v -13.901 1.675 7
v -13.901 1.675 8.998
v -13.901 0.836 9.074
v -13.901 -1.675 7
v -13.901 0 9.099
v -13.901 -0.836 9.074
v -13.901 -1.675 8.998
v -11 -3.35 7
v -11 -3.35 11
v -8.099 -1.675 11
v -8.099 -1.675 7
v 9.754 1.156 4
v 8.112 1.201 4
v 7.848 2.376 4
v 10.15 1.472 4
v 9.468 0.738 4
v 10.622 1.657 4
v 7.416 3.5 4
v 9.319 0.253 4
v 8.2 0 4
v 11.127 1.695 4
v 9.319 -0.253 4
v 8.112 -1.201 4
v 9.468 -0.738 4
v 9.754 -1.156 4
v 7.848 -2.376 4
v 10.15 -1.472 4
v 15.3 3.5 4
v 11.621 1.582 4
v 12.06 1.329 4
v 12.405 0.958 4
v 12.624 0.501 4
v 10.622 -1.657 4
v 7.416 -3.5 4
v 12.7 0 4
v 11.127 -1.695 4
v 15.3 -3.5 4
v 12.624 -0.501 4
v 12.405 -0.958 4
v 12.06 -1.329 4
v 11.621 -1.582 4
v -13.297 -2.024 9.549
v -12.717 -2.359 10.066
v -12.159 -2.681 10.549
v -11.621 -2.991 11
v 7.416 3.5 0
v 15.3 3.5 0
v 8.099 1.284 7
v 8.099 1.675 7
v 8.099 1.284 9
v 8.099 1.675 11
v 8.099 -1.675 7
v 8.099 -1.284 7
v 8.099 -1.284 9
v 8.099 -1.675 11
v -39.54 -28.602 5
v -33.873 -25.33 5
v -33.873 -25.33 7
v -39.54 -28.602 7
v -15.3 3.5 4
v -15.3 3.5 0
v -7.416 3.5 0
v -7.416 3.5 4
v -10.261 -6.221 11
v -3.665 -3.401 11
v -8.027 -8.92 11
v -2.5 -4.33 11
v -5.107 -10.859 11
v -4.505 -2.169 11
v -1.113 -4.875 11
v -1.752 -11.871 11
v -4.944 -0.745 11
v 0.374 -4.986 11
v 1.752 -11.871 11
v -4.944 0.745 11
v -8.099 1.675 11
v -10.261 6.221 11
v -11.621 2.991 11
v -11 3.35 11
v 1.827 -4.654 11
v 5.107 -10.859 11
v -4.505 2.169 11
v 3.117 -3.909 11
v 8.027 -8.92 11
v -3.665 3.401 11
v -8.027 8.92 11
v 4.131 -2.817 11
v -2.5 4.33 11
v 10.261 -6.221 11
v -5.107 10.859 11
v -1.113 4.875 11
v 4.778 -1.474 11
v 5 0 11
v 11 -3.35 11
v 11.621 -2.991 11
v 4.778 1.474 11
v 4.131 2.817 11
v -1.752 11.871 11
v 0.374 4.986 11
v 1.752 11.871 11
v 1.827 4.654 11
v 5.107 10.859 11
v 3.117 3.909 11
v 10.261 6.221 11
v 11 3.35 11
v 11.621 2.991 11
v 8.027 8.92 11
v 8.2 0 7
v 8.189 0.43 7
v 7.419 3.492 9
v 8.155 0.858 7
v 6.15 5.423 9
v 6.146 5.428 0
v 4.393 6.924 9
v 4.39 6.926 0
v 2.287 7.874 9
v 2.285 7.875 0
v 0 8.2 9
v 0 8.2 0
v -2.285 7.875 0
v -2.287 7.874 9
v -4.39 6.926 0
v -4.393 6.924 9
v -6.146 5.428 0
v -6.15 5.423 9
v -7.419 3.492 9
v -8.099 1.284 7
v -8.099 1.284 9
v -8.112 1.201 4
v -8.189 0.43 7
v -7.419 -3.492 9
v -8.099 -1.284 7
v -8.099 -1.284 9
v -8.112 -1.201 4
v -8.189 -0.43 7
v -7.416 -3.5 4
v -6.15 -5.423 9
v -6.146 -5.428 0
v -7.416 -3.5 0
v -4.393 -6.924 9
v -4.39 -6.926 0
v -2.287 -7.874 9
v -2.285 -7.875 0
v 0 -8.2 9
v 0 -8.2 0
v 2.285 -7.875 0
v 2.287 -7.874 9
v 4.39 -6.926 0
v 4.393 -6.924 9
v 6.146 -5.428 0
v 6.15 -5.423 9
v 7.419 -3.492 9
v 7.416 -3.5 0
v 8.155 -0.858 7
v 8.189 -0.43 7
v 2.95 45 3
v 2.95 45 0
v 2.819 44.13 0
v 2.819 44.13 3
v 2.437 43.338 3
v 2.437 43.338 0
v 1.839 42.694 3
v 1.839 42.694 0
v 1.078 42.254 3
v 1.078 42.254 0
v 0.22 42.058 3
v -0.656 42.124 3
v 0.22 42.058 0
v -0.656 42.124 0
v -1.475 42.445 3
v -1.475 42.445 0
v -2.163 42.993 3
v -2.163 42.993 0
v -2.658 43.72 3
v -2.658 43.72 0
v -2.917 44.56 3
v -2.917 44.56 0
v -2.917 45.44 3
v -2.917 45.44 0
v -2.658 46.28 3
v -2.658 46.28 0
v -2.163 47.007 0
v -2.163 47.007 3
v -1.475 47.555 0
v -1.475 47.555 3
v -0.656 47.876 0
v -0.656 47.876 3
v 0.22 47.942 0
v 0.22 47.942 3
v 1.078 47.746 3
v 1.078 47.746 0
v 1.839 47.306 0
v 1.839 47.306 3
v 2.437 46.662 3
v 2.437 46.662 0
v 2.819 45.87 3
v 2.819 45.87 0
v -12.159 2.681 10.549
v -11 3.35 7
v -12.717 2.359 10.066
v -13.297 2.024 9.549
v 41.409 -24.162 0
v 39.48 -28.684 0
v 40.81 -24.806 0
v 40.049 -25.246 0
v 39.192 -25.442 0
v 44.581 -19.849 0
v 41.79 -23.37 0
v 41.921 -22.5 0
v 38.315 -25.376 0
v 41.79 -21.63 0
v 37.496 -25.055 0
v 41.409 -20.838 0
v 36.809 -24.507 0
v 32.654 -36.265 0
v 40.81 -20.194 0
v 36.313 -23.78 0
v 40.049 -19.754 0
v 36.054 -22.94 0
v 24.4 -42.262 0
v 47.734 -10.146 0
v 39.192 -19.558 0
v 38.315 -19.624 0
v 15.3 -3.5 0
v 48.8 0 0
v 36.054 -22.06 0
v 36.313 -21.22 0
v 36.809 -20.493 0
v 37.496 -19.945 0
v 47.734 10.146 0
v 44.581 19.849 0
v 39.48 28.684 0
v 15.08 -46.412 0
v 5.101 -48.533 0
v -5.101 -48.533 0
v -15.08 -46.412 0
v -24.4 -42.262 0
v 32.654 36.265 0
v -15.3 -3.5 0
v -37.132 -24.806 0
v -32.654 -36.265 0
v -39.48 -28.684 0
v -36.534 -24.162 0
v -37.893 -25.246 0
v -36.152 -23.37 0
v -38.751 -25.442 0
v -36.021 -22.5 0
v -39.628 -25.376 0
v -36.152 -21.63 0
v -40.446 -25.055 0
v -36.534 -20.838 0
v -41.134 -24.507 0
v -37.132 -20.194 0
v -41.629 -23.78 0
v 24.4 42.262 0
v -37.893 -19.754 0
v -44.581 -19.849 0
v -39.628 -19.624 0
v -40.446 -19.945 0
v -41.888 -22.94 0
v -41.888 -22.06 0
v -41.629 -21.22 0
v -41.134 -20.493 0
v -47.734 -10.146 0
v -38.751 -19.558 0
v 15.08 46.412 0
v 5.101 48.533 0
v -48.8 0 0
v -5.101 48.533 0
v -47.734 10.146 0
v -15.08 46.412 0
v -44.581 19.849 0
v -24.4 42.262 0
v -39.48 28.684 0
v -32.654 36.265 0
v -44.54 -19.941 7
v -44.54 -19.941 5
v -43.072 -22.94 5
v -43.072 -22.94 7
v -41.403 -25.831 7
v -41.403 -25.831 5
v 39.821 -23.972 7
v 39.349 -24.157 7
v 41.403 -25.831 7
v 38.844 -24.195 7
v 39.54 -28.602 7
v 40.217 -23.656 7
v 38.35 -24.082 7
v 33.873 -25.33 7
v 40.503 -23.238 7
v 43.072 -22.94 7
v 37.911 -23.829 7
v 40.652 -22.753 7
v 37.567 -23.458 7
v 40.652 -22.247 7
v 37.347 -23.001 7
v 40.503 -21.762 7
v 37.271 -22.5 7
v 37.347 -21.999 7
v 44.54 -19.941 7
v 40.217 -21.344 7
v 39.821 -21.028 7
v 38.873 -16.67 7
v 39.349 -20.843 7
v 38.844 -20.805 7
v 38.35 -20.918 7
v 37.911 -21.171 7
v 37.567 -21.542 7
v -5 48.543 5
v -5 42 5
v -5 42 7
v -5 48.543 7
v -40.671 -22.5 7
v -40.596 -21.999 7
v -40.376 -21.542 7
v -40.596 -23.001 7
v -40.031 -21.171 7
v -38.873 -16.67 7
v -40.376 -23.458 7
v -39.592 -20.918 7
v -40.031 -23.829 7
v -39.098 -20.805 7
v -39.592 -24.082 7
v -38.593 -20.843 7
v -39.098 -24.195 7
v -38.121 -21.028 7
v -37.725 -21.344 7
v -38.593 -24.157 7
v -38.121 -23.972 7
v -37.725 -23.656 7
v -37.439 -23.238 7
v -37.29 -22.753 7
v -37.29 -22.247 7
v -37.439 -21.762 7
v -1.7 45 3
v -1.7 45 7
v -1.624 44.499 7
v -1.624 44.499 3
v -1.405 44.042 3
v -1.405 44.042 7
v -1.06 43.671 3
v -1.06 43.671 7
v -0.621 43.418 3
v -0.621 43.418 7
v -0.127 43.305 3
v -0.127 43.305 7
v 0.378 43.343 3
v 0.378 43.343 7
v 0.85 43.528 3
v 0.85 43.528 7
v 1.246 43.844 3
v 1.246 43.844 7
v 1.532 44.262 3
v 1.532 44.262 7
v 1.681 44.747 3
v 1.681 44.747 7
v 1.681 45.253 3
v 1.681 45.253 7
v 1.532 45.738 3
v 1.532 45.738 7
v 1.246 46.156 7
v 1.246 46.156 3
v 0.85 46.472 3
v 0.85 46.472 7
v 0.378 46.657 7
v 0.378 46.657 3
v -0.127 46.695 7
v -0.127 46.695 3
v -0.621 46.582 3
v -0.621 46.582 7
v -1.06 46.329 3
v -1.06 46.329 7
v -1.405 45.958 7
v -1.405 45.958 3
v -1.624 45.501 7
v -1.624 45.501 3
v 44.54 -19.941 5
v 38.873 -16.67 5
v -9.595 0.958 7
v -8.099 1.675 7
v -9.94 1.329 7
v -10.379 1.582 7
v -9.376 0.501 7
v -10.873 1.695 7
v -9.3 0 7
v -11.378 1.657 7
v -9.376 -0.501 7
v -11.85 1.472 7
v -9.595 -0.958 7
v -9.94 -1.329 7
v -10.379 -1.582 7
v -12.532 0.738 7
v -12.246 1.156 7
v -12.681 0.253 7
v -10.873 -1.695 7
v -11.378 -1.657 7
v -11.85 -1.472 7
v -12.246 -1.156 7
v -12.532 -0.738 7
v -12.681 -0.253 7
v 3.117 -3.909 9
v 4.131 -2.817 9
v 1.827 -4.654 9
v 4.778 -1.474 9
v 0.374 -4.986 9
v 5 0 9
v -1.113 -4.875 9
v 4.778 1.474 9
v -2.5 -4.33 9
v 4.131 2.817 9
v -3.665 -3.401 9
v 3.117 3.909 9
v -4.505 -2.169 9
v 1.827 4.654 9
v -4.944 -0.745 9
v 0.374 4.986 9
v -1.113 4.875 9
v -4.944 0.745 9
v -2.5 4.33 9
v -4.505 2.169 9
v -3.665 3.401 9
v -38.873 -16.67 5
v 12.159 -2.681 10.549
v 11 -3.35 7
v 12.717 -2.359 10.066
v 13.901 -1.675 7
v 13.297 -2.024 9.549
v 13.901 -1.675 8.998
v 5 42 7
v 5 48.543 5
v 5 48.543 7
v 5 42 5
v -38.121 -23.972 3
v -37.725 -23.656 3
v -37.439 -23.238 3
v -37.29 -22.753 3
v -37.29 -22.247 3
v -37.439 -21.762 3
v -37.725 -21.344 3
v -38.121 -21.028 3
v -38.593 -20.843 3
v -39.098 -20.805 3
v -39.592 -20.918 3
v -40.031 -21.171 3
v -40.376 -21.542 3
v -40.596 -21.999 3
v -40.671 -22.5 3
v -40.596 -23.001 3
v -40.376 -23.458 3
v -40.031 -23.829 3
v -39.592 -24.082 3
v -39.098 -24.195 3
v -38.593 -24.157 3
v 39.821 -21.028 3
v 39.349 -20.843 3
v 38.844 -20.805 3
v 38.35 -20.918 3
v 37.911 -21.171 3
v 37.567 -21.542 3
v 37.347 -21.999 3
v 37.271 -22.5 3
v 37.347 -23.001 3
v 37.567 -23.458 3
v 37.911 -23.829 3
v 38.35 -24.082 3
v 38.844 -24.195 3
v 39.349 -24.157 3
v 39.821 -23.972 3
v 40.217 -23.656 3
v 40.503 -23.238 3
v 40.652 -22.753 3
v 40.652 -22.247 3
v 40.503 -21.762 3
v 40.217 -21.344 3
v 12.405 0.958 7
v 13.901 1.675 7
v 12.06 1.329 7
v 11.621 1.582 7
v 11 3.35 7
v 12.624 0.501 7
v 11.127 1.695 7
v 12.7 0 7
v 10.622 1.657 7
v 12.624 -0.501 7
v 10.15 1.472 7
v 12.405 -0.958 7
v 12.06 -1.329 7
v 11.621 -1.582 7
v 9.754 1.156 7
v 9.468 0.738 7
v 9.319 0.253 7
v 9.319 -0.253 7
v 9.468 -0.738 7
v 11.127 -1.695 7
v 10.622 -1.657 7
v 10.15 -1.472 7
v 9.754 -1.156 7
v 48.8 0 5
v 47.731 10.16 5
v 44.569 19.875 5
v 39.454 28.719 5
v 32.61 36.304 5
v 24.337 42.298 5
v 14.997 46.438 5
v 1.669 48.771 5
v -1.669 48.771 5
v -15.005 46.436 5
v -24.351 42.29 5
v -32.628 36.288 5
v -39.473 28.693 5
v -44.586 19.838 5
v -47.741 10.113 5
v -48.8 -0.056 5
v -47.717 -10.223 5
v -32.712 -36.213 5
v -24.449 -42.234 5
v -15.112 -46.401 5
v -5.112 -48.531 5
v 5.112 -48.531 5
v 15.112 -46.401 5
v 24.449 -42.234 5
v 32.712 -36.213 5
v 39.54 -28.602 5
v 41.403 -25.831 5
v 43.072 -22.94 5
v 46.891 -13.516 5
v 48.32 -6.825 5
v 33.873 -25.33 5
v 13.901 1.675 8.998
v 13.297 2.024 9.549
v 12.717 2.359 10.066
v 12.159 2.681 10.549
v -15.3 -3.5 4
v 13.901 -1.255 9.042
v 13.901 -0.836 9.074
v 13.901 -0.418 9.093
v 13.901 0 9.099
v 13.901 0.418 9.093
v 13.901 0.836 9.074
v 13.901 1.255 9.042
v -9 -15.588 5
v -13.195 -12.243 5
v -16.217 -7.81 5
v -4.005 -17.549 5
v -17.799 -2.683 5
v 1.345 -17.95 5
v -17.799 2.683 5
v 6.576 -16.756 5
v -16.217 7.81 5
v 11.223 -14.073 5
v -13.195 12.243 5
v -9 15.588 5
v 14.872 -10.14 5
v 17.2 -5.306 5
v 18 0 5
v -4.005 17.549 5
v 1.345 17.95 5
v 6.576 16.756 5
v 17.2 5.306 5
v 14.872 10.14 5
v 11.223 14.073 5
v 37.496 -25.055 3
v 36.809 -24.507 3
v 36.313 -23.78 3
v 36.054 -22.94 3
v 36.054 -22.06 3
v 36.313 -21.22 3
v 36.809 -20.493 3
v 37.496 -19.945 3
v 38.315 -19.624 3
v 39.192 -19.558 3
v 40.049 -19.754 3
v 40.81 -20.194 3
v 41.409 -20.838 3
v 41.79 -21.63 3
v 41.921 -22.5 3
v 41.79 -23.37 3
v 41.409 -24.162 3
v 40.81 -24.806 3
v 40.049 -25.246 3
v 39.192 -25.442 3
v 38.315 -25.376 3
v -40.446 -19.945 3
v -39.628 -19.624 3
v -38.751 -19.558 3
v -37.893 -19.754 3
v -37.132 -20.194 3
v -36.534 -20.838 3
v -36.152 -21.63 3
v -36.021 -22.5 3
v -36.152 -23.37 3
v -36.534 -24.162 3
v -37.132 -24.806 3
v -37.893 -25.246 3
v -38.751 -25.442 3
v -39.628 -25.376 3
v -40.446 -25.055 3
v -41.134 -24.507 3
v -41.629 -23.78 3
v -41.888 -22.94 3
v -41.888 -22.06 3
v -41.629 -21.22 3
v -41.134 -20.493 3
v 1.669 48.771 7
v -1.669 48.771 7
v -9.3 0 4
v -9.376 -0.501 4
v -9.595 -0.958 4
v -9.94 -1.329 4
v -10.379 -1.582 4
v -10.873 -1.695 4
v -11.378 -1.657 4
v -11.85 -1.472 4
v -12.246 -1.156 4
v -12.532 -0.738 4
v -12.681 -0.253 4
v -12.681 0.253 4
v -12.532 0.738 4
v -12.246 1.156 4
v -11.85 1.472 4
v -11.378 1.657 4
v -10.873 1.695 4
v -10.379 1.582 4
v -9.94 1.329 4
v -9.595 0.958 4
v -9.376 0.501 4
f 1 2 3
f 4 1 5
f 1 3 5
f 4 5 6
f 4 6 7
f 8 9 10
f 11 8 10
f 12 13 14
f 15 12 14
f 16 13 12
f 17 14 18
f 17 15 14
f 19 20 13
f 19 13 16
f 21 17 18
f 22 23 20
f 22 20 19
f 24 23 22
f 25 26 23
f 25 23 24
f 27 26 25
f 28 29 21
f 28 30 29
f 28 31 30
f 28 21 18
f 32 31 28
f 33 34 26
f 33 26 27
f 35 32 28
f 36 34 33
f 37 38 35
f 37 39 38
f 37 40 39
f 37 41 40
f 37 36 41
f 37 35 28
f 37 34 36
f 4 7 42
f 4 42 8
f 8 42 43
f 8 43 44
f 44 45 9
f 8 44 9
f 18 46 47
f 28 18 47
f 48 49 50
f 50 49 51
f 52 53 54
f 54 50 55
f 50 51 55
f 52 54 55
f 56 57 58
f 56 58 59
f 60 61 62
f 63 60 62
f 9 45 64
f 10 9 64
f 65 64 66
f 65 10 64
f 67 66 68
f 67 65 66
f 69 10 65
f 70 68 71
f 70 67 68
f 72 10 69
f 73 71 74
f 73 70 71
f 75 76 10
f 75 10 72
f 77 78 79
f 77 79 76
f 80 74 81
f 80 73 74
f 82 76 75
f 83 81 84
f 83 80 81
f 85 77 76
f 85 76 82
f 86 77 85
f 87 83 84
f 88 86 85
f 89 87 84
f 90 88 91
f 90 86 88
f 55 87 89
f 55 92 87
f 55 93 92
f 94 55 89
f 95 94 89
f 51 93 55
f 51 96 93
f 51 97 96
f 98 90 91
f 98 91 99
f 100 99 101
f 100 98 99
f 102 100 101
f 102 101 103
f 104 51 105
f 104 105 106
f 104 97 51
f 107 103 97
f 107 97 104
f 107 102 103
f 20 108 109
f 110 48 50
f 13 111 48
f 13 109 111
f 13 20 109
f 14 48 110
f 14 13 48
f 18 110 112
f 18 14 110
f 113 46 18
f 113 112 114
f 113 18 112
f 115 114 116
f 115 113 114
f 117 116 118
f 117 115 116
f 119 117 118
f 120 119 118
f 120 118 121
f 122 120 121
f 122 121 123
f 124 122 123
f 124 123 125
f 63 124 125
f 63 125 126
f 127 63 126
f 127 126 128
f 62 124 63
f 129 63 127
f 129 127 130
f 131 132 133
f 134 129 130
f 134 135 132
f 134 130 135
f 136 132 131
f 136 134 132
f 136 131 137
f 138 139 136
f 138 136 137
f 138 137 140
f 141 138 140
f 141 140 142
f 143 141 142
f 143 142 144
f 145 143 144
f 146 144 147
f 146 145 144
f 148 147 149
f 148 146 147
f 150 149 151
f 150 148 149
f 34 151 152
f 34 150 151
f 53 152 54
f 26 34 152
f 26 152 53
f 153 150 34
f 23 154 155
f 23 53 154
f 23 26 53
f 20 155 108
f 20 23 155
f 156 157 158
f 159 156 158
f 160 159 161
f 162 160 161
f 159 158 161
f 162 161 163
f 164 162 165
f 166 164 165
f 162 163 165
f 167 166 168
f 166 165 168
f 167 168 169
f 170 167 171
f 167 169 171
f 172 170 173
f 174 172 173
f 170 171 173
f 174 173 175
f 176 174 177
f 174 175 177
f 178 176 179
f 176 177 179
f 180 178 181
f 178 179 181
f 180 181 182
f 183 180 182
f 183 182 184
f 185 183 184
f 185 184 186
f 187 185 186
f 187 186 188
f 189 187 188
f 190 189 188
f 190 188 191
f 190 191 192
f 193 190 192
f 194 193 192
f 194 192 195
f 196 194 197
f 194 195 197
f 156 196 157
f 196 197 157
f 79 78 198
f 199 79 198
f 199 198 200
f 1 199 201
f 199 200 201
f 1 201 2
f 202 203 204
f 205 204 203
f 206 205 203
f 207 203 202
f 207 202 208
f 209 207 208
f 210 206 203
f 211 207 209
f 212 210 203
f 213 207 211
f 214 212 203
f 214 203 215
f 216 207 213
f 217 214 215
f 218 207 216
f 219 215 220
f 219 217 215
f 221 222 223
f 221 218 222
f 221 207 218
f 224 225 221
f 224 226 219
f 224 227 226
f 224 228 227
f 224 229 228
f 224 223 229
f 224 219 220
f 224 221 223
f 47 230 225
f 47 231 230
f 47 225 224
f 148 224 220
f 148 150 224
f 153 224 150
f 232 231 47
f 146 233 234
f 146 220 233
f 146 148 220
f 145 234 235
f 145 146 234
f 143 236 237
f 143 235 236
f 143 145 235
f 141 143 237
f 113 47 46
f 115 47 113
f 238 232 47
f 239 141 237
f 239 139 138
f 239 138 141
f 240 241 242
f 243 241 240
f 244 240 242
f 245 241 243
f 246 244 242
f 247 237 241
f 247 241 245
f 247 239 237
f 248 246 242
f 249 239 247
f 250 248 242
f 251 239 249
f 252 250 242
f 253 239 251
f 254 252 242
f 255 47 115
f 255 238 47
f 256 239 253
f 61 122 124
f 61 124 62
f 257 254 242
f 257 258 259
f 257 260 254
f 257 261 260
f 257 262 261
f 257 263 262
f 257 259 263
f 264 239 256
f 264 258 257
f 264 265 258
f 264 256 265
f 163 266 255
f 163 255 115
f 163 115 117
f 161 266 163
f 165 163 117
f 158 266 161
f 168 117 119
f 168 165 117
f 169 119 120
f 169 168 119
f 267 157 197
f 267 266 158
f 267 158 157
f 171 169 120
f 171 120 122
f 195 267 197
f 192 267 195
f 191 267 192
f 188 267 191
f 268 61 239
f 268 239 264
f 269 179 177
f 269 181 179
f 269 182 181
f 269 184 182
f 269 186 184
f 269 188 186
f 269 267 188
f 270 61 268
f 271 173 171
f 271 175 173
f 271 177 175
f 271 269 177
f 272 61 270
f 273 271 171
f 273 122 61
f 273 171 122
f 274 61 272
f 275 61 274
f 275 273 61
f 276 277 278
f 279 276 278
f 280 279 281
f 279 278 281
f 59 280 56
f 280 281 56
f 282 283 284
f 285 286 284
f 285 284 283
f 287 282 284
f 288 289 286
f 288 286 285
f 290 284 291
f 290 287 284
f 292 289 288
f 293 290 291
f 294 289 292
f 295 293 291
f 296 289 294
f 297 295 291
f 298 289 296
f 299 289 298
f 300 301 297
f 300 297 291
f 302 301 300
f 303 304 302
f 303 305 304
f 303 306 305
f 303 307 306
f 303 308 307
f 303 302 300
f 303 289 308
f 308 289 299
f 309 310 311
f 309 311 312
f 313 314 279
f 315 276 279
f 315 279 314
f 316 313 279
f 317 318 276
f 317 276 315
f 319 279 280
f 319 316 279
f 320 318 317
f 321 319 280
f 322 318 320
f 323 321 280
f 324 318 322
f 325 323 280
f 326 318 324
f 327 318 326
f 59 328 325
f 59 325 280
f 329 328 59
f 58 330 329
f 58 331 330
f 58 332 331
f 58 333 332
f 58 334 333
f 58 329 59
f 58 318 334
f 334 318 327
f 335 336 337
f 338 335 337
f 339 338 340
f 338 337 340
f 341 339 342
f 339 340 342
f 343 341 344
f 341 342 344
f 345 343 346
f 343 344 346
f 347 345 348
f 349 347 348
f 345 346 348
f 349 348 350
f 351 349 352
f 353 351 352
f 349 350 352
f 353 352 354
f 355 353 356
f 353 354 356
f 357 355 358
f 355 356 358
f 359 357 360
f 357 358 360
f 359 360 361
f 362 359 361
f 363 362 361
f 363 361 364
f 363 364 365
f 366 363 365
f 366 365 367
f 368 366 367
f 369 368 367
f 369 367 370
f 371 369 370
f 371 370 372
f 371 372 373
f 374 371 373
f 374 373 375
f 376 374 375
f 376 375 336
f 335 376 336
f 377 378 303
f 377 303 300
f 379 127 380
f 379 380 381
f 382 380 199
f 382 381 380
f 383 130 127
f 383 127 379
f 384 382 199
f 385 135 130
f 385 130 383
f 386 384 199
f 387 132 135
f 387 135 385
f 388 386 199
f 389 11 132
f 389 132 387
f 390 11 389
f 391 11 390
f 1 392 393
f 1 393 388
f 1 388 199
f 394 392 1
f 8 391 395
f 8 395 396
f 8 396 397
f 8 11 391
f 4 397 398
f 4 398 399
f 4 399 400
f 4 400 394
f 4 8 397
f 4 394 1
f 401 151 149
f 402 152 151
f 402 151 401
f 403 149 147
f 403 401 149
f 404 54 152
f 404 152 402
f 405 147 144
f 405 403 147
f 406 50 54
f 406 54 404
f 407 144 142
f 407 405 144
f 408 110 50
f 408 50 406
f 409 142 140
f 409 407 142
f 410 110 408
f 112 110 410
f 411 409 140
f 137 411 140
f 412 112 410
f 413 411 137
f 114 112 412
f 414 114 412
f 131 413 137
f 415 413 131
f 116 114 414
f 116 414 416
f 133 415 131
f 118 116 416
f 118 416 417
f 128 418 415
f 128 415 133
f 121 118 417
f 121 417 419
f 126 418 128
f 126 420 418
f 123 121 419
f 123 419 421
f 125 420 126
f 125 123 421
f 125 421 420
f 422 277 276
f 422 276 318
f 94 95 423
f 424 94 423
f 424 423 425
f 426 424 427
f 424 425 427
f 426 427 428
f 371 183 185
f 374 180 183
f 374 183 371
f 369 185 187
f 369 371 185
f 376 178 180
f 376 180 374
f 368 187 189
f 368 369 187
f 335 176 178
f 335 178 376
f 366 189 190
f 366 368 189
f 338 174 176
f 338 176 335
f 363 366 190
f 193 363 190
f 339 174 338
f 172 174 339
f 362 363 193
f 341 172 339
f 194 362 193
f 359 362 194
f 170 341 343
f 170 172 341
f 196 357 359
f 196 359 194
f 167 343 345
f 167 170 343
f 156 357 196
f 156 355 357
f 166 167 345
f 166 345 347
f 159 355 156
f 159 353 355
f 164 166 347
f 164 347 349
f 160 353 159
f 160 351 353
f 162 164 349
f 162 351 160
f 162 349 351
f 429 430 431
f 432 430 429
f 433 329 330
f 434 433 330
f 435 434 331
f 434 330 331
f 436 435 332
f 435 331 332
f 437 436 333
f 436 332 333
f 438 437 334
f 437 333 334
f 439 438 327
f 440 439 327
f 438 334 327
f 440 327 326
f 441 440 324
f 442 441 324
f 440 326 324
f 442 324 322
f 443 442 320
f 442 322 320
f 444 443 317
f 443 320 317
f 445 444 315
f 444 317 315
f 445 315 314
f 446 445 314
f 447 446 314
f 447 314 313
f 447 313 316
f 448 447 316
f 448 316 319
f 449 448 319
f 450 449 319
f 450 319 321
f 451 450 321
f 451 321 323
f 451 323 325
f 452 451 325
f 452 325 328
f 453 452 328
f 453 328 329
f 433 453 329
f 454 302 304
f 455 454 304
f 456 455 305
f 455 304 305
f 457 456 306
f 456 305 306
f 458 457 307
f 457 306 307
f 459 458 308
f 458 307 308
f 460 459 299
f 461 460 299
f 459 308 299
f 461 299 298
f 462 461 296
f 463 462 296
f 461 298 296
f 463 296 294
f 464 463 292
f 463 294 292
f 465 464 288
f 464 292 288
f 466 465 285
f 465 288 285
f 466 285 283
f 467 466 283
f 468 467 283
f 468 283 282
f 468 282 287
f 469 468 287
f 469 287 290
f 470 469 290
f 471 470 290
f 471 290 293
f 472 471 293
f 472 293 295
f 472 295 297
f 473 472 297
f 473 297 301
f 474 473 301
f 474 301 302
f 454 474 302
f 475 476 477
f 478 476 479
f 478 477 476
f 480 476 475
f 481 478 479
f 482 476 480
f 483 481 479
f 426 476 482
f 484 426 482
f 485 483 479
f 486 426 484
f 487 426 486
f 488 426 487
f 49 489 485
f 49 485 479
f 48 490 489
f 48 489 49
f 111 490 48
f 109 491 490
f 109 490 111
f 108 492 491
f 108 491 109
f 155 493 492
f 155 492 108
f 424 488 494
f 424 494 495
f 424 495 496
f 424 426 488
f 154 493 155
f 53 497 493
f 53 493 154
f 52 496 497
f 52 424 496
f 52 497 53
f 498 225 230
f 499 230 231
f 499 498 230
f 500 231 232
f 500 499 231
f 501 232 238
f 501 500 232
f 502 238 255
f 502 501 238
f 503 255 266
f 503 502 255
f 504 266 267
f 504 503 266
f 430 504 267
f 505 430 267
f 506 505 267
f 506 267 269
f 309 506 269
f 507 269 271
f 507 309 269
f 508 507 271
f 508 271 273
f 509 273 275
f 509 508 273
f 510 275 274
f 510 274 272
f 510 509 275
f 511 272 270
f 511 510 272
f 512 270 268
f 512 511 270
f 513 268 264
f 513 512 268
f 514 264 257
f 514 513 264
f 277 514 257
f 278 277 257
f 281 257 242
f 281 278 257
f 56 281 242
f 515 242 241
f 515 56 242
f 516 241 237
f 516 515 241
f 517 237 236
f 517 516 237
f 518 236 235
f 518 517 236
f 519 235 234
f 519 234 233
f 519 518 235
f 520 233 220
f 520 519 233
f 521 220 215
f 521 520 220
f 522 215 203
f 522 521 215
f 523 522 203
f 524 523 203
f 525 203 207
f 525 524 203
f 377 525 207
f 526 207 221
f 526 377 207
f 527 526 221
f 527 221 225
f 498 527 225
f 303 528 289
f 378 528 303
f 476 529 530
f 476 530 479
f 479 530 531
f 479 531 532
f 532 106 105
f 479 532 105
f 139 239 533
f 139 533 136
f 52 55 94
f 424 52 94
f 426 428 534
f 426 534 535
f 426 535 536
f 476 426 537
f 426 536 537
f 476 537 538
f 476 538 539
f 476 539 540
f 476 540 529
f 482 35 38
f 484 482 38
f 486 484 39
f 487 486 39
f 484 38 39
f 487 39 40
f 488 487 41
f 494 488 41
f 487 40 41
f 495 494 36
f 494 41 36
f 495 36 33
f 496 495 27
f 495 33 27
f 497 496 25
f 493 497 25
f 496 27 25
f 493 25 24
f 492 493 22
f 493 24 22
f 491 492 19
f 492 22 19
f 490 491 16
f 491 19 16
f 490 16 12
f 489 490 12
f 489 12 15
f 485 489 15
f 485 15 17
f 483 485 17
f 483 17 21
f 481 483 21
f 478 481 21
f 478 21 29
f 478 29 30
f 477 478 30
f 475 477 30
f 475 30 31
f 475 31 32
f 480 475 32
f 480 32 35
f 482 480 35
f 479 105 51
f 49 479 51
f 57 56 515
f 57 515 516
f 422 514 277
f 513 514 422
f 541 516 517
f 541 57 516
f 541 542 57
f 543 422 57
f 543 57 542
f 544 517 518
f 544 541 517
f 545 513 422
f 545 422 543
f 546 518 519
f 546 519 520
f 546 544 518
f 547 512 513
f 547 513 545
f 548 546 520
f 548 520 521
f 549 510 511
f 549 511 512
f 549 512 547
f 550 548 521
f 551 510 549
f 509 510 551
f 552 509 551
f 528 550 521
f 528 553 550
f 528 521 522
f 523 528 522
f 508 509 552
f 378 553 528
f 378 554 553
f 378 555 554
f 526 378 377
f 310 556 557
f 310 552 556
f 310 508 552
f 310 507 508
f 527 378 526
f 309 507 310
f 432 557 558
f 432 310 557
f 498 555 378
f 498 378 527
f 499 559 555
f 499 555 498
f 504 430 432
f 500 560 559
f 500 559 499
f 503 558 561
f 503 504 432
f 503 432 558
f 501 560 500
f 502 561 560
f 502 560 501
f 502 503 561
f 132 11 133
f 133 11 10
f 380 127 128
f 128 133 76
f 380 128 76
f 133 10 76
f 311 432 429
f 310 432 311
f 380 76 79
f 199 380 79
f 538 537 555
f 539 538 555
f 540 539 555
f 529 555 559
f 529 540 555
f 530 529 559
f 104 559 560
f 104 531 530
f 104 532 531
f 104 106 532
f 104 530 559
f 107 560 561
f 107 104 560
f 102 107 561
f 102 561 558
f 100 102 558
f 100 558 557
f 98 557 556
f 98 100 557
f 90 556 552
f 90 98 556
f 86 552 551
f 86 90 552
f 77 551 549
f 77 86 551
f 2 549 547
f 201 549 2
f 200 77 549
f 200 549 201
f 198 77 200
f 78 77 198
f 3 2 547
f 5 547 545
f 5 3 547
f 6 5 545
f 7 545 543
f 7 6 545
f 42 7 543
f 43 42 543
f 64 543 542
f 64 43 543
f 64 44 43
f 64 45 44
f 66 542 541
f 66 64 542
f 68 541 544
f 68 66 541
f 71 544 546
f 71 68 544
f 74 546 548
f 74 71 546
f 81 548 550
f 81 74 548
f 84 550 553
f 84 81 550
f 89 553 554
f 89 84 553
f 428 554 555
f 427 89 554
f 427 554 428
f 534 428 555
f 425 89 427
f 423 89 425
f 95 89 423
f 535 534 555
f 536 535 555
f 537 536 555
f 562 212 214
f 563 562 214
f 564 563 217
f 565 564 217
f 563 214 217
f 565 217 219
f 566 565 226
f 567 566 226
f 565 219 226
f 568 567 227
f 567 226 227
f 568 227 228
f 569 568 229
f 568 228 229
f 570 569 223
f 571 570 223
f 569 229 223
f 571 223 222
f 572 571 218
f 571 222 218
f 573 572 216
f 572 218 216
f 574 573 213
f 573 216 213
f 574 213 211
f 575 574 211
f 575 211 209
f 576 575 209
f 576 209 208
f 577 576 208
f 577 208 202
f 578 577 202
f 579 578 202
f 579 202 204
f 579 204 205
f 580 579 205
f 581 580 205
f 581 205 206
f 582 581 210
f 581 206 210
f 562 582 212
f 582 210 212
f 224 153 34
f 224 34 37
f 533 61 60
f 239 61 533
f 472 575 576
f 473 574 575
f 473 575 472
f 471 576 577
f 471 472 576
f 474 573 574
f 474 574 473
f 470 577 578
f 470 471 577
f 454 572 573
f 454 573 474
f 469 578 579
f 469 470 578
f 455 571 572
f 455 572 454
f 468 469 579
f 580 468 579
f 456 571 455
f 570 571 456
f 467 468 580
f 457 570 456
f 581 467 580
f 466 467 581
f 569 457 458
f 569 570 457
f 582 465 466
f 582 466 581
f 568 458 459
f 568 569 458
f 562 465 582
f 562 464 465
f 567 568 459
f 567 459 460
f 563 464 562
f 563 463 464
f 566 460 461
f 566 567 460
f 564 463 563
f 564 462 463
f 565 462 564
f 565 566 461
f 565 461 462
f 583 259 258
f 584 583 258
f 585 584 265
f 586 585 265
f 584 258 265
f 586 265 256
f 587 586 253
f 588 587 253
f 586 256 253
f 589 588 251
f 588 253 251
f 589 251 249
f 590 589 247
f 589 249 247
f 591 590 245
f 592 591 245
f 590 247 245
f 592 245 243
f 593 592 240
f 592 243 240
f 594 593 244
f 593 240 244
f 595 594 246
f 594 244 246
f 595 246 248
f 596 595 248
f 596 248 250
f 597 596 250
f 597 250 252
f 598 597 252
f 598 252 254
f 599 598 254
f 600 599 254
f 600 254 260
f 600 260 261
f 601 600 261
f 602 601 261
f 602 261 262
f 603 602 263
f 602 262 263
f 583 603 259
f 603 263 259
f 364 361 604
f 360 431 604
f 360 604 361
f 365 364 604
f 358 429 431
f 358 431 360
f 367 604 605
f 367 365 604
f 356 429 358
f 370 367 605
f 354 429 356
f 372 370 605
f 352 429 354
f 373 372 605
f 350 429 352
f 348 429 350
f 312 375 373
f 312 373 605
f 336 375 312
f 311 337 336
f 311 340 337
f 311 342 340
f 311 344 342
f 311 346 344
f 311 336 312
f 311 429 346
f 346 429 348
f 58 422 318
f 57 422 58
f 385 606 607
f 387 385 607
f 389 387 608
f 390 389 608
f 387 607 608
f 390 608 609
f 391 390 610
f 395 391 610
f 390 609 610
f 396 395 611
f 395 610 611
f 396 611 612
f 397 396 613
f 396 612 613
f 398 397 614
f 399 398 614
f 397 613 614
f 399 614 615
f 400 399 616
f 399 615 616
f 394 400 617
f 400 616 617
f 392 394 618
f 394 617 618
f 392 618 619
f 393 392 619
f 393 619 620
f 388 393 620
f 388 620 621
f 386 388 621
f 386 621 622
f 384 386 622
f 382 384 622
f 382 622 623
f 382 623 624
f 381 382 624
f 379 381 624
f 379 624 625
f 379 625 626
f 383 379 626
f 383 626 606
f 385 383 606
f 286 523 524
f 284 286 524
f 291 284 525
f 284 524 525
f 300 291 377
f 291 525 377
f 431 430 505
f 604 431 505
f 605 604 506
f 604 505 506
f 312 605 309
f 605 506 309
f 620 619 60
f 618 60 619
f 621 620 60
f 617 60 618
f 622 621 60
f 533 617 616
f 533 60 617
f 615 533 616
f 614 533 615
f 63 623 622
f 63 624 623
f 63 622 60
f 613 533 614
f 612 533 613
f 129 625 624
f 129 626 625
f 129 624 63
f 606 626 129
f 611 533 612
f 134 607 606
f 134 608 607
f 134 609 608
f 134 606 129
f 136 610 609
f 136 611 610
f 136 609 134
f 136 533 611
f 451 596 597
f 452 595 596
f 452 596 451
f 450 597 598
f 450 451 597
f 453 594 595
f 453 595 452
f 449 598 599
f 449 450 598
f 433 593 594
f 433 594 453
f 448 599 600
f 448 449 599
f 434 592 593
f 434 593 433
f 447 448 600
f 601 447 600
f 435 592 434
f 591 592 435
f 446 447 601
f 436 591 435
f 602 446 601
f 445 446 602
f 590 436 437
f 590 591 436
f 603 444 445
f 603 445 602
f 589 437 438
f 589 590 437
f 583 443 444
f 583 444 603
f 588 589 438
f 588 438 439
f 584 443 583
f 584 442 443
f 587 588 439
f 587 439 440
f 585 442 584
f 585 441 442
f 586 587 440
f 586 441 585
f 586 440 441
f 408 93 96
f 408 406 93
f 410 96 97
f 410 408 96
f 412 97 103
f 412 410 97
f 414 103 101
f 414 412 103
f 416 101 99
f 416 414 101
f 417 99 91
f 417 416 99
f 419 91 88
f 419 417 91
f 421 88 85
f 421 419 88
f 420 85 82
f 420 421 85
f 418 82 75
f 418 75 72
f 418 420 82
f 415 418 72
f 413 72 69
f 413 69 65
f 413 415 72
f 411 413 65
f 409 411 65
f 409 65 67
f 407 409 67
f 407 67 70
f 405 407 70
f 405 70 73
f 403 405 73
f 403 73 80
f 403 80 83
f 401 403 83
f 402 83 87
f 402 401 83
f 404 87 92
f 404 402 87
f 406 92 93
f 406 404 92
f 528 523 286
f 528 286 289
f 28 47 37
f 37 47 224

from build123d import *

# Parameters (mm, degrees)
SKETCH001_W        = 30.6
SKETCH001_H        = 7
POCKET_DEPTH       = 4
SKETCH002_R        = 1.7
POCKET001_DEPTH    = 7.001
POCKET002_DEPTH    = 4
PAD_DEPTH          = 2
SKETCH005_R        = 1.7
POCKET003_DEPTH    = 283.930739
SKETCH006_R        = 2.95
POCKET004_DEPTH    = 3
POLARPATTERN_COUNT = 3


with BuildPart() as part:
    # Sketch → Revolution (revolve)
    with BuildSketch(Plane.XZ):
        Polygon((5, 11), (5, 9), (8.2, 9), (8.2, 0), (48.8, 0), (48.8, 5), (18, 5), (12, 11), align=None)
    revolve(axis=Axis((0, 0, 0), (0, 0, 1)))

    # Sketch001 (on Face4 of Revolution) → Pocket (cut)
    with BuildSketch(Plane(origin=(0, 0, 0), x_dir=(1, 0, 0), z_dir=(0, 0, -1))):
        Rectangle(SKETCH001_W, SKETCH001_H)
    extrude(amount=-POCKET_DEPTH, mode=Mode.SUBTRACT)

    # Sketch002 (on Face11 of Pocket) → Pocket001 (cut, through all)
    with BuildSketch(Plane(origin=(0, 0, 4), x_dir=(1, 0, 0), z_dir=(0, 0, -1))):
        with Locations((-11, 0)):
            Circle(SKETCH002_R)
        with Locations((11, 0)):
            Circle(SKETCH002_R)
    extrude(amount=-POCKET001_DEPTH, mode=Mode.SUBTRACT)

    # Sketch003 (on Face2 of Pocket001) → Pocket002 (cut)
    with BuildSketch(Plane(origin=(0, 0, 11), x_dir=(-1, 0, 0), z_dir=(0, 0, 1))):
        Polygon((-11, -3.35), (-8.098815, -1.675), (-8.098815, 1.675), (-11, 3.35), (-13.901185, 1.675), (-13.901185, -1.675), align=None)
        Polygon((11, -3.35), (13.901185, -1.675), (13.901185, 1.675), (11, 3.35), (8.098815, 1.675), (8.098815, -1.675), align=None)
    extrude(amount=-POCKET002_DEPTH, mode=Mode.SUBTRACT)

    # Sketch004 (on Face18 of Pocket002) → Pad (join)
    with BuildSketch(Plane(origin=(0, 0, 5), x_dir=(-1, 0, 0), z_dir=(0, 0, 1))):
        with BuildLine():
            ThreePointArc((-5, -48.543177), (0, -48.8), (5, -48.543177))
            Line((5, -42), (5, -48.543177))
            Line((-5, -42), (5, -42))
            Line((-5, -48.543177), (-5, -42))
        make_face()
    pad = extrude(amount=PAD_DEPTH)

    # Sketch005 (on Face35 of Pad) → Pocket003 (cut, through all)
    with BuildSketch(Plane(origin=(0, 0, 7), x_dir=(-1, 0, 0), z_dir=(0, 0, 1))):
        with Locations((0, -45)):
            Circle(SKETCH005_R)
    pocket003 = extrude(amount=-POCKET003_DEPTH, mode=Mode.SUBTRACT)

    # Sketch006 (on Face23 of Pocket003) → Pocket004 (cut)
    with BuildSketch(Plane(origin=(0, 0, 0), x_dir=(1, 0, 0), z_dir=(0, 0, -1))):
        with Locations((0, -45)):
            Circle(SKETCH006_R)
    pocket004 = extrude(amount=-POCKET004_DEPTH, mode=Mode.SUBTRACT)

    # PolarPattern: Pad, Pocket003, Pocket004 ×3 about axis
    polarpattern_axis = Axis((0, 0, 5), (0, 0, 1))
    for i in range(1, POLARPATTERN_COUNT):
        add(pad.rotate(polarpattern_axis, i * 360 / POLARPATTERN_COUNT))
        add(pocket003.rotate(polarpattern_axis, i * 360 / POLARPATTERN_COUNT), mode=Mode.SUBTRACT)
        add(pocket004.rotate(polarpattern_axis, i * 360 / POLARPATTERN_COUNT), mode=Mode.SUBTRACT)


solid = part.part
